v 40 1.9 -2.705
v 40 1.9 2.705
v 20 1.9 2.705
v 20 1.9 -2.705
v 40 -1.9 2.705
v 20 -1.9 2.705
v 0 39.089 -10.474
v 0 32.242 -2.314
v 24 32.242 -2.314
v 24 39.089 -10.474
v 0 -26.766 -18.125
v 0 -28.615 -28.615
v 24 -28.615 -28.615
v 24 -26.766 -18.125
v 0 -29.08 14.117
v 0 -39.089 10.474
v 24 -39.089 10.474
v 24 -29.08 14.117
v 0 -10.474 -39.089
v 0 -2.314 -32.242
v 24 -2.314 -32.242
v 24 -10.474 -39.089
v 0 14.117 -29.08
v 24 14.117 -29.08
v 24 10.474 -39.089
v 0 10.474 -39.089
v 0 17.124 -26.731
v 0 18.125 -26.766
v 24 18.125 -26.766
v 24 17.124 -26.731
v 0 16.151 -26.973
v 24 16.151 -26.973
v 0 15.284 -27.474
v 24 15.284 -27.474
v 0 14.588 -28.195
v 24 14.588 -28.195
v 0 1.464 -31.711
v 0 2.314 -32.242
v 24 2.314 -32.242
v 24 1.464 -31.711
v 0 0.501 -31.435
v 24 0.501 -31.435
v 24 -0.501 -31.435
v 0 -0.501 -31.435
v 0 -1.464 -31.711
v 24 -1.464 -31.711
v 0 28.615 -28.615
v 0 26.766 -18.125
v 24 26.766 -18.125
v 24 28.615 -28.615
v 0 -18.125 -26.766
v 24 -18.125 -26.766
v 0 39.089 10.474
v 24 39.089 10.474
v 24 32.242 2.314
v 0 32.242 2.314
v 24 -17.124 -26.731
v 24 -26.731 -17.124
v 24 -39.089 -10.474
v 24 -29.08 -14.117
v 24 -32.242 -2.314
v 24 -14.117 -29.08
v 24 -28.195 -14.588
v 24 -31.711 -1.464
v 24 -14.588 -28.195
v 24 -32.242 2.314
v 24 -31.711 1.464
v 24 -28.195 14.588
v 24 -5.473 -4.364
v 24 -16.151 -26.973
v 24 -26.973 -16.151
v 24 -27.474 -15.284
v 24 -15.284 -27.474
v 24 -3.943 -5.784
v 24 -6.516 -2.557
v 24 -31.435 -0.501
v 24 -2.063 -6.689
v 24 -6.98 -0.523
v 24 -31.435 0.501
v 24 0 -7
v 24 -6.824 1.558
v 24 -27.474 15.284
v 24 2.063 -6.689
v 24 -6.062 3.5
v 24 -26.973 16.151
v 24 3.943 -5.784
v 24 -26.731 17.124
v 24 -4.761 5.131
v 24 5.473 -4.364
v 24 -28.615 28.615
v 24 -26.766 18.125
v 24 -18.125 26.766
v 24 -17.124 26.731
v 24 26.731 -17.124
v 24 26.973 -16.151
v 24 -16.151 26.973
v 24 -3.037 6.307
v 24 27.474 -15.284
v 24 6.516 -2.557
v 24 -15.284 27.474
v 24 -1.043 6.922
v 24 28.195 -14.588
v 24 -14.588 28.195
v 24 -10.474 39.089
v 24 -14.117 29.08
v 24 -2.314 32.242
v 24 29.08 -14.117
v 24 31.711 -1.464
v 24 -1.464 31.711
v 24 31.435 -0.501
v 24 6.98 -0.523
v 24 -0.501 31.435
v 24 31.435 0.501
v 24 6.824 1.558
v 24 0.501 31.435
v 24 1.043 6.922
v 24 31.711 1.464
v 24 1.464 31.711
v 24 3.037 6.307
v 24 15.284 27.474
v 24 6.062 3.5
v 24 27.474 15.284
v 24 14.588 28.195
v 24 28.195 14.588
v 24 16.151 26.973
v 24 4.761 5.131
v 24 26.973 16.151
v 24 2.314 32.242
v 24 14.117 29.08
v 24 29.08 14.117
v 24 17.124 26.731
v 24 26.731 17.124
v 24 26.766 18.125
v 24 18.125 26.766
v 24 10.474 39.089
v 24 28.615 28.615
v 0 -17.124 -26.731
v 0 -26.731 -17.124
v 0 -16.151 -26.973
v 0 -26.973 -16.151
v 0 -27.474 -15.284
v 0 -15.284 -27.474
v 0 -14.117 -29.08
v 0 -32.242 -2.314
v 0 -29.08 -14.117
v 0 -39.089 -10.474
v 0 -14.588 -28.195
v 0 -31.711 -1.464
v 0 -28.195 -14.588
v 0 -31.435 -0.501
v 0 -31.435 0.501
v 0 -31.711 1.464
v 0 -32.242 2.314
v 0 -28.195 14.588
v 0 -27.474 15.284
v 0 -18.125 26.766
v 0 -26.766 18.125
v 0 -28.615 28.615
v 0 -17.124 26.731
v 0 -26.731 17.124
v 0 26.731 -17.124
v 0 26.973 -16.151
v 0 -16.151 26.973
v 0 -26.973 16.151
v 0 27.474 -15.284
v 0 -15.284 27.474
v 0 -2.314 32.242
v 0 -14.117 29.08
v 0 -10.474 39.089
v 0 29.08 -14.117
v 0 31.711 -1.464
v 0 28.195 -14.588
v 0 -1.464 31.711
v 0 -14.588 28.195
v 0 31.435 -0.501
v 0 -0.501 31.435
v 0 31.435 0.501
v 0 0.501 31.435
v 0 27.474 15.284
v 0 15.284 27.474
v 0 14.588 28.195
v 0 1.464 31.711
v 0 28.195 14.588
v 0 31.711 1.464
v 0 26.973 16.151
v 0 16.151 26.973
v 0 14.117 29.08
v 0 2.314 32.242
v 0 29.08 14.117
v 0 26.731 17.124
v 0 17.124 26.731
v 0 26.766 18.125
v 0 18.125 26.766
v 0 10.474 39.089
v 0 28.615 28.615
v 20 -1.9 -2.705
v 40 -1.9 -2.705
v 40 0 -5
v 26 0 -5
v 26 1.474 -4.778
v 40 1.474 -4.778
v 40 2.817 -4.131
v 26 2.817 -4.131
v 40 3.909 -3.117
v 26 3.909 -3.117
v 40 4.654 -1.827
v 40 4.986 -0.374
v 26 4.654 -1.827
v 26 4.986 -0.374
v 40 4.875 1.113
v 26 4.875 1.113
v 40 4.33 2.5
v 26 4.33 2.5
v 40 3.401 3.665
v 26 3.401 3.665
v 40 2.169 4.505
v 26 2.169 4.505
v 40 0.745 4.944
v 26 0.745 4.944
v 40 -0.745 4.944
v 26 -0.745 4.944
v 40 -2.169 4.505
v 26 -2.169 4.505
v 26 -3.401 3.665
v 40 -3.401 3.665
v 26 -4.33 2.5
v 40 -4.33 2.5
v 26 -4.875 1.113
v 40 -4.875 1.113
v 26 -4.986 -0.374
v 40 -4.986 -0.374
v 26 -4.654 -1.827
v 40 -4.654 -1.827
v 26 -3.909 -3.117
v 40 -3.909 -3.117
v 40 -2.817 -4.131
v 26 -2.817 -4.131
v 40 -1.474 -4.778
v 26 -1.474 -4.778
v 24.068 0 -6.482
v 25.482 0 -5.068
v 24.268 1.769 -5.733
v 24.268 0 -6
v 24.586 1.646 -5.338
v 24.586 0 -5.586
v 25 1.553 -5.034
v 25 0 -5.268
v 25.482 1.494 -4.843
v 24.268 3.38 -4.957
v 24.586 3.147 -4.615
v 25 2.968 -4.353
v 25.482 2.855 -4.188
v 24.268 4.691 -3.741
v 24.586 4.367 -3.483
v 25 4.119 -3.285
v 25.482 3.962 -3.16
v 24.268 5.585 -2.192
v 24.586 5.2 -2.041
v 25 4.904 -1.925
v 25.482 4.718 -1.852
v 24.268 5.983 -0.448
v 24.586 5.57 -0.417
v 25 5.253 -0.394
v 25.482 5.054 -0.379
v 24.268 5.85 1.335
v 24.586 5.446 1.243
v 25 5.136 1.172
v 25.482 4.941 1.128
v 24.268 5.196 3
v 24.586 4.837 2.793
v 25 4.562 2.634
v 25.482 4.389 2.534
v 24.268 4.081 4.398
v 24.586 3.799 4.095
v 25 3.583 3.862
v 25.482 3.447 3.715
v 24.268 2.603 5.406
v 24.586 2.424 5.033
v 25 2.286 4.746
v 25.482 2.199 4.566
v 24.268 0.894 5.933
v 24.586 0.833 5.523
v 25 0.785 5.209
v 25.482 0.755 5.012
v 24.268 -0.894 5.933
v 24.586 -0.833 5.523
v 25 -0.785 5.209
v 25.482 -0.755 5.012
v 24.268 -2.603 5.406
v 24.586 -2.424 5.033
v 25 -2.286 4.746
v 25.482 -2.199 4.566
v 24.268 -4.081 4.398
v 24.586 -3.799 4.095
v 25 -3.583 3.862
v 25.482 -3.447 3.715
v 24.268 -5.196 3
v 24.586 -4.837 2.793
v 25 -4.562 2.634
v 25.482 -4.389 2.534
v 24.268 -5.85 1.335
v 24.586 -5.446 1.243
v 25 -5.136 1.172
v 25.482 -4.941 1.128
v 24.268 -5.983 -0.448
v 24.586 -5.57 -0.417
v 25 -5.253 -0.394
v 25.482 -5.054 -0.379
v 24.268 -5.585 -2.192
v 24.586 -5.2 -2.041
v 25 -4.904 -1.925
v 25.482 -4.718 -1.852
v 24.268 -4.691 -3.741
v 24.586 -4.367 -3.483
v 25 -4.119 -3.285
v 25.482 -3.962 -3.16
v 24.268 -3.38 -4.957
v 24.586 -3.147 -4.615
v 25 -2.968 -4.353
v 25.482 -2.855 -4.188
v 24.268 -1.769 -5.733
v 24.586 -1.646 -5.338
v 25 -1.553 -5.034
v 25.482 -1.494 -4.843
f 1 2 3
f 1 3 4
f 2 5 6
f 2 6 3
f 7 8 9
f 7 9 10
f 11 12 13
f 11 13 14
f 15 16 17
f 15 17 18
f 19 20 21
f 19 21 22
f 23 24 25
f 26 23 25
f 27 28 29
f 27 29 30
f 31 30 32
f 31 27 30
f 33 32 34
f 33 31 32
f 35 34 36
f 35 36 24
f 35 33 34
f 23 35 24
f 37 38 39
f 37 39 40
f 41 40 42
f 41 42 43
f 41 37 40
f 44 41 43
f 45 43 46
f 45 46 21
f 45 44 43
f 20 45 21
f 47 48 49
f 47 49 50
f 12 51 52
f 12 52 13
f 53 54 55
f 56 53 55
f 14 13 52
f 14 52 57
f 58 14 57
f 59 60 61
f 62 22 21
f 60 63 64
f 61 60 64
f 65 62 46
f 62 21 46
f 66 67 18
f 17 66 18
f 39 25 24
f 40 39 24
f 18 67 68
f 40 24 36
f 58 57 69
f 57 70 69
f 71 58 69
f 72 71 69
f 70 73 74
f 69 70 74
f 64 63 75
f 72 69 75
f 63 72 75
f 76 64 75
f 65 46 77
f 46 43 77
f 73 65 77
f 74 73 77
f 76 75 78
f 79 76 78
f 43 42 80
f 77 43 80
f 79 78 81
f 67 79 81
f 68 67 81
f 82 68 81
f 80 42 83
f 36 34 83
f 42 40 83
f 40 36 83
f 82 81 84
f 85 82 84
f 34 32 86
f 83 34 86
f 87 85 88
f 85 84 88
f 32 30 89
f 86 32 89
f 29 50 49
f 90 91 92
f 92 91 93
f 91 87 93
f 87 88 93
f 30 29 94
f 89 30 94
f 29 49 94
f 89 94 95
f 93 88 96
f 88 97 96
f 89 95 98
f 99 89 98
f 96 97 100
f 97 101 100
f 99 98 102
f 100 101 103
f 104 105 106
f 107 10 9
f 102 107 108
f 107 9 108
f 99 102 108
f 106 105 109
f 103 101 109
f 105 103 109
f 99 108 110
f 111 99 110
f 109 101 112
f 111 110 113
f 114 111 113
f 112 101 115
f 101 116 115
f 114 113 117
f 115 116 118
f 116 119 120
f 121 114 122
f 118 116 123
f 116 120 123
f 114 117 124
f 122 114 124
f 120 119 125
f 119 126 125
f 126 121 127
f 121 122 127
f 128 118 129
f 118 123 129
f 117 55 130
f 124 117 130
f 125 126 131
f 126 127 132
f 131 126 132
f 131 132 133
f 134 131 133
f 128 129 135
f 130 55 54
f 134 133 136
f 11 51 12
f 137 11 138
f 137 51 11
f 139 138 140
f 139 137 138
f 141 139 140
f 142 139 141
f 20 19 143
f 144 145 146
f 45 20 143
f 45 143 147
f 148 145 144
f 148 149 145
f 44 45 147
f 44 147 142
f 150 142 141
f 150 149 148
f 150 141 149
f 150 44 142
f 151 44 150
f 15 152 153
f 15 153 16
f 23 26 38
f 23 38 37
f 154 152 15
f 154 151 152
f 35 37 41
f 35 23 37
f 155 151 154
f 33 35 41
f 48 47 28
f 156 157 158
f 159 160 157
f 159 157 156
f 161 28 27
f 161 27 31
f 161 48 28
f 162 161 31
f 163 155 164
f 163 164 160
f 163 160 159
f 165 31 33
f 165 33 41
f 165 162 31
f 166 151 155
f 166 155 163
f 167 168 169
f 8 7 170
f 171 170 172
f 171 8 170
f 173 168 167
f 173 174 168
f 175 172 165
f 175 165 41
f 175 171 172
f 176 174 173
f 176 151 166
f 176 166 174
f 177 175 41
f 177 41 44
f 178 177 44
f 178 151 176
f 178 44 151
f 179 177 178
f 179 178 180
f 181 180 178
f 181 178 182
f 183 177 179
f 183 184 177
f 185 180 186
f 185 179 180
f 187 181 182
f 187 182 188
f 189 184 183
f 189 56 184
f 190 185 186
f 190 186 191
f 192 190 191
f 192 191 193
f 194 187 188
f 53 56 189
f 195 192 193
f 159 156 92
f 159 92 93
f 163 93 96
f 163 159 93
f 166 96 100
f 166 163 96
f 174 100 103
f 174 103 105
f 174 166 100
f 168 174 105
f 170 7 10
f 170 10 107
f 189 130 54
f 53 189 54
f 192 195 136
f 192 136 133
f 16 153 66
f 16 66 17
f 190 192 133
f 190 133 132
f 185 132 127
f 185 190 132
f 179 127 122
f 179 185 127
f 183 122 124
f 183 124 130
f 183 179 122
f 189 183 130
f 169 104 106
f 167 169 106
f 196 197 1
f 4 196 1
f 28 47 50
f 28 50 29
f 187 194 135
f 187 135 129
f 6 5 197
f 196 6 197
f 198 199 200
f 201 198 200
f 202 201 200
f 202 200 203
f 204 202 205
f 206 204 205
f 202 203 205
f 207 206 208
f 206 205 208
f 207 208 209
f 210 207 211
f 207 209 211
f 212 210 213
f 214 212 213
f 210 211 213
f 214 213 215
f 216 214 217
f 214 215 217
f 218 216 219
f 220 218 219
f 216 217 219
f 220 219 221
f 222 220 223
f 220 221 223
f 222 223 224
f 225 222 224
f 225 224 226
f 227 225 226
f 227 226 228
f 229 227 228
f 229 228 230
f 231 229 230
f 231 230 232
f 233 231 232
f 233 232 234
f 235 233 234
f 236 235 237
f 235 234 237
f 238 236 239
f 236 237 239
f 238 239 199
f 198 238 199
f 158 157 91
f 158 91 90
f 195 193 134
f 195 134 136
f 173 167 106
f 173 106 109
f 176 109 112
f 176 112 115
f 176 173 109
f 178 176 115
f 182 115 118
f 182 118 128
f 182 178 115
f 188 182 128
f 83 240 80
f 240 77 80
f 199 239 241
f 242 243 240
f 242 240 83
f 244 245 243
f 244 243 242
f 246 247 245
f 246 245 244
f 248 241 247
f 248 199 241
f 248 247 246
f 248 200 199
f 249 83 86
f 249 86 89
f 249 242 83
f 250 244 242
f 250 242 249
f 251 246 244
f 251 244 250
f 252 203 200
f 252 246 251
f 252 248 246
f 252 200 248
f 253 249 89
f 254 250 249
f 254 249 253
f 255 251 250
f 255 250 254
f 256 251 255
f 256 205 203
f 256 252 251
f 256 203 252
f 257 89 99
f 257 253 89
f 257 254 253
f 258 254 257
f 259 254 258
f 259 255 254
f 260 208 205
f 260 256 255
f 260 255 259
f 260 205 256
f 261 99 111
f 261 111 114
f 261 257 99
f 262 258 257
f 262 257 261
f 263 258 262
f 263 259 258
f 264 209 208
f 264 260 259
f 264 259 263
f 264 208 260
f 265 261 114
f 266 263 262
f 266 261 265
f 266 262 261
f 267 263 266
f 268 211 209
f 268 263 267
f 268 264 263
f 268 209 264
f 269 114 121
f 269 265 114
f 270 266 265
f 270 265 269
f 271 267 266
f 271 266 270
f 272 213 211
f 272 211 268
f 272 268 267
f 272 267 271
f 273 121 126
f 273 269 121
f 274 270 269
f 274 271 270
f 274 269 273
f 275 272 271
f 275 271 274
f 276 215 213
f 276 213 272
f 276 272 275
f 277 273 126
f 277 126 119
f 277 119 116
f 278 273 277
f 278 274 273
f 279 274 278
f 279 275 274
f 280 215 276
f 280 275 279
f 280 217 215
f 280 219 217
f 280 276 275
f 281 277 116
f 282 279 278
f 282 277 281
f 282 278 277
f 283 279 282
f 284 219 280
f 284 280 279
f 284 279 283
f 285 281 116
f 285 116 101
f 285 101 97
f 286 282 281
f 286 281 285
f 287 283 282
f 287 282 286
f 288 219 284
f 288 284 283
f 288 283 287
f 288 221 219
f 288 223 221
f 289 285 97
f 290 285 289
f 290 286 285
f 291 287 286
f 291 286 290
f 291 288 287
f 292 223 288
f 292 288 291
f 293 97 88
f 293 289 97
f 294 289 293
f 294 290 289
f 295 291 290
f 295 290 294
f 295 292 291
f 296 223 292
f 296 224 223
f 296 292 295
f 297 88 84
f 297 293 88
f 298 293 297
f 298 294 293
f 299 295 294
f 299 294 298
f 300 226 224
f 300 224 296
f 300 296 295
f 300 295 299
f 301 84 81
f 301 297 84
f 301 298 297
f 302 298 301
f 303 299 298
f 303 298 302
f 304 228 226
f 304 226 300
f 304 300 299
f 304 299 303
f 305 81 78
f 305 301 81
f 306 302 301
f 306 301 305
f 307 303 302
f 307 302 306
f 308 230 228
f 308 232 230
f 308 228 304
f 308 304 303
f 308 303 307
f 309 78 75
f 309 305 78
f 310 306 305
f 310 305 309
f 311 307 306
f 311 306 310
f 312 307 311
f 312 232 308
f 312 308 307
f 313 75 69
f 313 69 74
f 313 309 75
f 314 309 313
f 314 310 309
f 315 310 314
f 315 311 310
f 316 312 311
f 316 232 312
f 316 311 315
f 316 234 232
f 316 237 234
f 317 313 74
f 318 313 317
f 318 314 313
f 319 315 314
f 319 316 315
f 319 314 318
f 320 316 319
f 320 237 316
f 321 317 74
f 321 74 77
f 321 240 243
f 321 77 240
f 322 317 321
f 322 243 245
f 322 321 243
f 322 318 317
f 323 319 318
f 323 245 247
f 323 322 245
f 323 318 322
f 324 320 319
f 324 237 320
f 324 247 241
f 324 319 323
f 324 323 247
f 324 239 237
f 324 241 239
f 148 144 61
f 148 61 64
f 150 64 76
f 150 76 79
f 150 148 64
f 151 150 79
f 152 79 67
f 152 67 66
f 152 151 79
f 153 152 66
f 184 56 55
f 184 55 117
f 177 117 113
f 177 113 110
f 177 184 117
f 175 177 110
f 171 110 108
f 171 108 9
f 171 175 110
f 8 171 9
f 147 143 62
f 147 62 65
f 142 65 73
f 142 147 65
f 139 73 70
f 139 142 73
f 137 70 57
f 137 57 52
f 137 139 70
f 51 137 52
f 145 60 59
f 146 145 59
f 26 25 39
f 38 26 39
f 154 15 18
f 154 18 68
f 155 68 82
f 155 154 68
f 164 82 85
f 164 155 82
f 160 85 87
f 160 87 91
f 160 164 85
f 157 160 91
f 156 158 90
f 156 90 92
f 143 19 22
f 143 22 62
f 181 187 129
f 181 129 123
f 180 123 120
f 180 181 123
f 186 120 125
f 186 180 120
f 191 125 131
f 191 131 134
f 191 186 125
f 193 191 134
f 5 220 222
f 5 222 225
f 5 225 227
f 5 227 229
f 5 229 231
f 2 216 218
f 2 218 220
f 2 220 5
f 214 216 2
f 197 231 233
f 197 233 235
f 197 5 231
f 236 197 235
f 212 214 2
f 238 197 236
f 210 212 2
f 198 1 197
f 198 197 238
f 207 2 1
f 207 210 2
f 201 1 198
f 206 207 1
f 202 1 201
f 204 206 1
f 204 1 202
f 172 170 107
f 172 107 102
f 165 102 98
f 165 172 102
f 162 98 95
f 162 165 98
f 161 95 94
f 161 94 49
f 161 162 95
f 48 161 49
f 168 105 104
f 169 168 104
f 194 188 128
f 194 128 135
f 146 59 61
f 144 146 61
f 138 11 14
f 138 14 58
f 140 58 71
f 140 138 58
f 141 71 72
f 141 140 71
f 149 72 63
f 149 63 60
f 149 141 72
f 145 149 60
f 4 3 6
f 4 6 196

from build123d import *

# Parameters (mm, degrees)
BOSS_EXTRUDE1_DEPTH = 24
SKETCH2_R           = 5
BOSS_EXTRUDE2_DEPTH = 16
FILLET1_R           = 2
SKETCH4_W           = 5.41
SKETCH4_H           = 3.8
CUT_EXTRUDE1_DEPTH  = 20


with BuildPart() as part:
    # Sketch1 → Boss-Extrude1 (new body)
    with BuildSketch(Plane(origin=(0, 0, 0), x_dir=(0, 0, -1), z_dir=(1, 0, 0))):
        with BuildLine():
            Line((2.314035395, 32.242240005), (10.473918124, 39.089194593))
            Line((10.473918124, 39.089194593), (14.117106565, 29.079616616))
            ThreePointArc((14.117106565, 29.079616616), (15.7, 27.193197679), (18.12513344, 26.765581222))
            Line((18.12513344, 26.765581222), (28.615276469, 28.615276469))
            Line((28.615276469, 28.615276469), (26.765581222, 18.12513344))
            ThreePointArc((26.765581222, 18.12513344), (27.193197679, 15.7), (29.079616616, 14.117106565))
            Line((29.079616616, 14.117106565), (39.089194593, 10.473918124))
            Line((39.089194593, 10.473918124), (32.242240005, 2.314035395))
            ThreePointArc((32.242240005, 2.314035395), (31.4, 0), (32.242240005, -2.314035395))
            Line((32.242240005, -2.314035395), (39.089194593, -10.473918124))
            Line((39.089194593, -10.473918124), (29.079616616, -14.117106565))
            ThreePointArc((29.079616616, -14.117106565), (27.193197679, -15.7), (26.765581222, -18.12513344))
            Line((26.765581222, -18.12513344), (28.615276469, -28.615276469))
            Line((28.615276469, -28.615276469), (18.12513344, -26.765581222))
            ThreePointArc((18.12513344, -26.765581222), (15.7, -27.193197679), (14.117106565, -29.079616616))
            Line((14.117106565, -29.079616616), (10.473918124, -39.089194593))
            Line((10.473918124, -39.089194593), (2.314035395, -32.242240005))
            ThreePointArc((2.314035395, -32.242240005), (0, -31.4), (-2.314035395, -32.242240005))
            Line((-2.314035395, -32.242240005), (-10.473918124, -39.089194593))
            Line((-10.473918124, -39.089194593), (-14.117106565, -29.079616616))
            ThreePointArc((-14.117106565, -29.079616616), (-15.7, -27.193197679), (-18.12513344, -26.765581222))
            Line((-18.12513344, -26.765581222), (-28.615276469, -28.615276469))
            Line((-28.615276469, -28.615276469), (-26.765581222, -18.12513344))
            ThreePointArc((-26.765581222, -18.12513344), (-27.193197679, -15.7), (-29.079616616, -14.117106565))
            Line((-29.079616616, -14.117106565), (-39.089194593, -10.473918124))
            Line((-39.089194593, -10.473918124), (-32.242240005, -2.314035395))
            ThreePointArc((-32.242240005, -2.314035395), (-31.4, 0), (-32.242240005, 2.314035395))
            Line((-32.242240005, 2.314035395), (-39.089194593, 10.473918124))
            Line((-39.089194593, 10.473918124), (-29.079616616, 14.117106565))
            ThreePointArc((-29.079616616, 14.117106565), (-27.193197679, 15.7), (-26.765581222, 18.12513344))
            Line((-26.765581222, 18.12513344), (-28.615276469, 28.615276469))
            Line((-28.615276469, 28.615276469), (-18.12513344, 26.765581222))
            ThreePointArc((-18.12513344, 26.765581222), (-15.7, 27.193197679), (-14.117106565, 29.079616616))
            Line((-14.117106565, 29.079616616), (-10.473918124, 39.089194593))
            Line((-10.473918124, 39.089194593), (-2.314035395, 32.242240005))
            ThreePointArc((-2.314035395, 32.242240005), (0, 31.4), (2.314035395, 32.242240005))
        make_face()
    extrude(amount=BOSS_EXTRUDE1_DEPTH)

    # Sketch2 → Boss-Extrude2 (add)
    with BuildSketch(Plane(origin=(24, 0, 0), x_dir=(0, 0, -1), z_dir=(1, 0, 0))):
        Circle(SKETCH2_R)
    extrude(amount=BOSS_EXTRUDE2_DEPTH)

    # Fillet1
    fillet1_edges = [part.edges().sort_by_distance(p)[0] for p in [
        (24, 0, 5),
    ]]
    fillet(fillet1_edges, radius=FILLET1_R)

    # Sketch4 → Cut-Extrude1 (cut)
    with BuildSketch(Plane(origin=(40, 0, 0), x_dir=(0, 0, -1), z_dir=(1, 0, 0))):
        Rectangle(SKETCH4_W, SKETCH4_H)
    extrude(amount=-CUT_EXTRUDE1_DEPTH, mode=Mode.SUBTRACT)


solid = part.part
